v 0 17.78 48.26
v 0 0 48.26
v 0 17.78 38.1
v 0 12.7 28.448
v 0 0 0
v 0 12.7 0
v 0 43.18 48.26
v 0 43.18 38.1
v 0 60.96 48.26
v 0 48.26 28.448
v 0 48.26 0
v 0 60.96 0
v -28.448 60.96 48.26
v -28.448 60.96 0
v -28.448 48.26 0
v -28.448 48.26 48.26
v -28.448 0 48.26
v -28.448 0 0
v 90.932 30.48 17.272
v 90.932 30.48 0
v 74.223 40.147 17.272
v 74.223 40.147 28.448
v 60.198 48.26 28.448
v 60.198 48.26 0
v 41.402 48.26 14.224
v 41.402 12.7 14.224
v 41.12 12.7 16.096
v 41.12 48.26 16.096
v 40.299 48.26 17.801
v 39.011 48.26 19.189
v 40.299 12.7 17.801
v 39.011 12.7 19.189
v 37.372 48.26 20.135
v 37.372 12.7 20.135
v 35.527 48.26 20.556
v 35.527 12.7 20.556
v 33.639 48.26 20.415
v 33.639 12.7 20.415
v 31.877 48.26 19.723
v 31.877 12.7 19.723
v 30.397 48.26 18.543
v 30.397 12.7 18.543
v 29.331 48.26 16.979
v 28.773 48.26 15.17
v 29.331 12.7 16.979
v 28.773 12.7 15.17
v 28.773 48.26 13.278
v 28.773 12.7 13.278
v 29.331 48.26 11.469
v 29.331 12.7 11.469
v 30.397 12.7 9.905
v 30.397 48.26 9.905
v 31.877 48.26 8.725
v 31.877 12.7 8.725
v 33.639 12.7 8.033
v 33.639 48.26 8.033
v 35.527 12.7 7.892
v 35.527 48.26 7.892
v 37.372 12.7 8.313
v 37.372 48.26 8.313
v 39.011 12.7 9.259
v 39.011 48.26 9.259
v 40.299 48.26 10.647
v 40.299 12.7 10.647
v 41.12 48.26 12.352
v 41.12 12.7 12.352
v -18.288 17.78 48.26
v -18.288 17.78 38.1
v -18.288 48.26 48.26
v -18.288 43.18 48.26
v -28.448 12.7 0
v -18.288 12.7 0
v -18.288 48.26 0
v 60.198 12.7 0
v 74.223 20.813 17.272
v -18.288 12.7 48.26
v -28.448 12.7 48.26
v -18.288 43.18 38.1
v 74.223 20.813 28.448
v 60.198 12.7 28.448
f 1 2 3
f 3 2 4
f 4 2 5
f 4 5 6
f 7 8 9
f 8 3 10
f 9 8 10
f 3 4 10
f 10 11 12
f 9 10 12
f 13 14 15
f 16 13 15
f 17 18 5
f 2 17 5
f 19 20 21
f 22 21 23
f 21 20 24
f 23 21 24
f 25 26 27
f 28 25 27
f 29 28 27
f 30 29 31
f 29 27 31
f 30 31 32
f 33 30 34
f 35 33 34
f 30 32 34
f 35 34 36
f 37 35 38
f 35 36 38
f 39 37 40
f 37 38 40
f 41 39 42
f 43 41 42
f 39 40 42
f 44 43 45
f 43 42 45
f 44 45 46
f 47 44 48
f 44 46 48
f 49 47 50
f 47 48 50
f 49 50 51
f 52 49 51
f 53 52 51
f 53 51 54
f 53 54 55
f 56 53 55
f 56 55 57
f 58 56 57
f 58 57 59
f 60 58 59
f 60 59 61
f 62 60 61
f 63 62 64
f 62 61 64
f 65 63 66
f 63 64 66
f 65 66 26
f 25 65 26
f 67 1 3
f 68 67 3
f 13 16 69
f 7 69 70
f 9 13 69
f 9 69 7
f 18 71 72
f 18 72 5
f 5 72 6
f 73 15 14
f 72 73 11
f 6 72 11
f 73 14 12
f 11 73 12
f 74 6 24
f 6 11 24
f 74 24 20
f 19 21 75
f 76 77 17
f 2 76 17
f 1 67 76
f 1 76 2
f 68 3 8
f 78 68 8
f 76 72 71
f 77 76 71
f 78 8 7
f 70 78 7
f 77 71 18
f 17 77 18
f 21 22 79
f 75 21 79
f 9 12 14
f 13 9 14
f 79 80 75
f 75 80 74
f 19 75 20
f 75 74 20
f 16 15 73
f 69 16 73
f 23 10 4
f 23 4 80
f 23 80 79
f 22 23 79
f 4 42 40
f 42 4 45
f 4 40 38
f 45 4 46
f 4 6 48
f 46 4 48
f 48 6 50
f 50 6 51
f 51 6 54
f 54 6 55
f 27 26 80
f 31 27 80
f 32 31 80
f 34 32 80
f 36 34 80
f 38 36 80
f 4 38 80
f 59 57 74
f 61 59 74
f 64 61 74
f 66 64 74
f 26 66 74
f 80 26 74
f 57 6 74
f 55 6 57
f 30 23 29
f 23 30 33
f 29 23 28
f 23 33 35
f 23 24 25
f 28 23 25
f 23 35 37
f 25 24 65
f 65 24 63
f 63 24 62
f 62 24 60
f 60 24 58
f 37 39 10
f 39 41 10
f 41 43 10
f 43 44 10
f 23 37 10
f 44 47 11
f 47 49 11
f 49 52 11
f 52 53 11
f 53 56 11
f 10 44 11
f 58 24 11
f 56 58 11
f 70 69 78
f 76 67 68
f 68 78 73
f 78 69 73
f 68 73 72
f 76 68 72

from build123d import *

# Parameters (mm, degrees)
F1_DEPTH = 48.26
F3_DEPTH = 18.288
F5_DEPTH = 28.448
F7_DEPTH = 11.176
F8_R     = 6.35
F9_DEPTH = 35.56


with BuildPart() as f1:
    # F0 (on Top) → F1 (new body)
    with BuildSketch(Plane.XY):
        Polygon((-28.448, 0), (0, 0), (0, 30.48), (0, 60.96), (-28.448, 60.96), (-28.448, 48.26), (-18.288, 48.26), (-18.288, 43.18), (-18.288, 30.48), (-18.288, 17.78), (-18.288, 12.7), (-28.448, 12.7), align=None)
    extrude(amount=F1_DEPTH)

    # F2 (on face) → F3 (cut, through all)
    with BuildSketch(Plane.YZ):
        Polygon((17.78, 38.1), (30.48, 38.1), (43.18, 38.1), (43.18, 48.26), (30.48, 48.26), (17.78, 48.26), align=None)
    extrude(amount=-F3_DEPTH, mode=Mode.SUBTRACT)

    # F4 (on Top) → F5 (join)
    with BuildSketch(Plane.XY):
        Polygon((0, 30.48), (0, 12.7), (60.198, 12.7), (90.932, 30.48), (60.198, 48.26), (0, 48.26), align=None)
    extrude(amount=F5_DEPTH)

    # F6 (on face) → F7 (cut)
    with BuildSketch(Plane.XY.offset(28.448)):
        Polygon((74.22266, 20.81344), (90.932, 30.48), (74.22266, 40.14656), align=None)
    extrude(amount=-F7_DEPTH, mode=Mode.SUBTRACT)

    # F8 (on face) → F9 (cut, through all)
    with BuildSketch(Plane.XZ.offset(-12.7)):
        with Locations((35.052, 14.224)):
            Circle(F8_R)
    extrude(amount=-F9_DEPTH, mode=Mode.SUBTRACT)


solid = f1.part
